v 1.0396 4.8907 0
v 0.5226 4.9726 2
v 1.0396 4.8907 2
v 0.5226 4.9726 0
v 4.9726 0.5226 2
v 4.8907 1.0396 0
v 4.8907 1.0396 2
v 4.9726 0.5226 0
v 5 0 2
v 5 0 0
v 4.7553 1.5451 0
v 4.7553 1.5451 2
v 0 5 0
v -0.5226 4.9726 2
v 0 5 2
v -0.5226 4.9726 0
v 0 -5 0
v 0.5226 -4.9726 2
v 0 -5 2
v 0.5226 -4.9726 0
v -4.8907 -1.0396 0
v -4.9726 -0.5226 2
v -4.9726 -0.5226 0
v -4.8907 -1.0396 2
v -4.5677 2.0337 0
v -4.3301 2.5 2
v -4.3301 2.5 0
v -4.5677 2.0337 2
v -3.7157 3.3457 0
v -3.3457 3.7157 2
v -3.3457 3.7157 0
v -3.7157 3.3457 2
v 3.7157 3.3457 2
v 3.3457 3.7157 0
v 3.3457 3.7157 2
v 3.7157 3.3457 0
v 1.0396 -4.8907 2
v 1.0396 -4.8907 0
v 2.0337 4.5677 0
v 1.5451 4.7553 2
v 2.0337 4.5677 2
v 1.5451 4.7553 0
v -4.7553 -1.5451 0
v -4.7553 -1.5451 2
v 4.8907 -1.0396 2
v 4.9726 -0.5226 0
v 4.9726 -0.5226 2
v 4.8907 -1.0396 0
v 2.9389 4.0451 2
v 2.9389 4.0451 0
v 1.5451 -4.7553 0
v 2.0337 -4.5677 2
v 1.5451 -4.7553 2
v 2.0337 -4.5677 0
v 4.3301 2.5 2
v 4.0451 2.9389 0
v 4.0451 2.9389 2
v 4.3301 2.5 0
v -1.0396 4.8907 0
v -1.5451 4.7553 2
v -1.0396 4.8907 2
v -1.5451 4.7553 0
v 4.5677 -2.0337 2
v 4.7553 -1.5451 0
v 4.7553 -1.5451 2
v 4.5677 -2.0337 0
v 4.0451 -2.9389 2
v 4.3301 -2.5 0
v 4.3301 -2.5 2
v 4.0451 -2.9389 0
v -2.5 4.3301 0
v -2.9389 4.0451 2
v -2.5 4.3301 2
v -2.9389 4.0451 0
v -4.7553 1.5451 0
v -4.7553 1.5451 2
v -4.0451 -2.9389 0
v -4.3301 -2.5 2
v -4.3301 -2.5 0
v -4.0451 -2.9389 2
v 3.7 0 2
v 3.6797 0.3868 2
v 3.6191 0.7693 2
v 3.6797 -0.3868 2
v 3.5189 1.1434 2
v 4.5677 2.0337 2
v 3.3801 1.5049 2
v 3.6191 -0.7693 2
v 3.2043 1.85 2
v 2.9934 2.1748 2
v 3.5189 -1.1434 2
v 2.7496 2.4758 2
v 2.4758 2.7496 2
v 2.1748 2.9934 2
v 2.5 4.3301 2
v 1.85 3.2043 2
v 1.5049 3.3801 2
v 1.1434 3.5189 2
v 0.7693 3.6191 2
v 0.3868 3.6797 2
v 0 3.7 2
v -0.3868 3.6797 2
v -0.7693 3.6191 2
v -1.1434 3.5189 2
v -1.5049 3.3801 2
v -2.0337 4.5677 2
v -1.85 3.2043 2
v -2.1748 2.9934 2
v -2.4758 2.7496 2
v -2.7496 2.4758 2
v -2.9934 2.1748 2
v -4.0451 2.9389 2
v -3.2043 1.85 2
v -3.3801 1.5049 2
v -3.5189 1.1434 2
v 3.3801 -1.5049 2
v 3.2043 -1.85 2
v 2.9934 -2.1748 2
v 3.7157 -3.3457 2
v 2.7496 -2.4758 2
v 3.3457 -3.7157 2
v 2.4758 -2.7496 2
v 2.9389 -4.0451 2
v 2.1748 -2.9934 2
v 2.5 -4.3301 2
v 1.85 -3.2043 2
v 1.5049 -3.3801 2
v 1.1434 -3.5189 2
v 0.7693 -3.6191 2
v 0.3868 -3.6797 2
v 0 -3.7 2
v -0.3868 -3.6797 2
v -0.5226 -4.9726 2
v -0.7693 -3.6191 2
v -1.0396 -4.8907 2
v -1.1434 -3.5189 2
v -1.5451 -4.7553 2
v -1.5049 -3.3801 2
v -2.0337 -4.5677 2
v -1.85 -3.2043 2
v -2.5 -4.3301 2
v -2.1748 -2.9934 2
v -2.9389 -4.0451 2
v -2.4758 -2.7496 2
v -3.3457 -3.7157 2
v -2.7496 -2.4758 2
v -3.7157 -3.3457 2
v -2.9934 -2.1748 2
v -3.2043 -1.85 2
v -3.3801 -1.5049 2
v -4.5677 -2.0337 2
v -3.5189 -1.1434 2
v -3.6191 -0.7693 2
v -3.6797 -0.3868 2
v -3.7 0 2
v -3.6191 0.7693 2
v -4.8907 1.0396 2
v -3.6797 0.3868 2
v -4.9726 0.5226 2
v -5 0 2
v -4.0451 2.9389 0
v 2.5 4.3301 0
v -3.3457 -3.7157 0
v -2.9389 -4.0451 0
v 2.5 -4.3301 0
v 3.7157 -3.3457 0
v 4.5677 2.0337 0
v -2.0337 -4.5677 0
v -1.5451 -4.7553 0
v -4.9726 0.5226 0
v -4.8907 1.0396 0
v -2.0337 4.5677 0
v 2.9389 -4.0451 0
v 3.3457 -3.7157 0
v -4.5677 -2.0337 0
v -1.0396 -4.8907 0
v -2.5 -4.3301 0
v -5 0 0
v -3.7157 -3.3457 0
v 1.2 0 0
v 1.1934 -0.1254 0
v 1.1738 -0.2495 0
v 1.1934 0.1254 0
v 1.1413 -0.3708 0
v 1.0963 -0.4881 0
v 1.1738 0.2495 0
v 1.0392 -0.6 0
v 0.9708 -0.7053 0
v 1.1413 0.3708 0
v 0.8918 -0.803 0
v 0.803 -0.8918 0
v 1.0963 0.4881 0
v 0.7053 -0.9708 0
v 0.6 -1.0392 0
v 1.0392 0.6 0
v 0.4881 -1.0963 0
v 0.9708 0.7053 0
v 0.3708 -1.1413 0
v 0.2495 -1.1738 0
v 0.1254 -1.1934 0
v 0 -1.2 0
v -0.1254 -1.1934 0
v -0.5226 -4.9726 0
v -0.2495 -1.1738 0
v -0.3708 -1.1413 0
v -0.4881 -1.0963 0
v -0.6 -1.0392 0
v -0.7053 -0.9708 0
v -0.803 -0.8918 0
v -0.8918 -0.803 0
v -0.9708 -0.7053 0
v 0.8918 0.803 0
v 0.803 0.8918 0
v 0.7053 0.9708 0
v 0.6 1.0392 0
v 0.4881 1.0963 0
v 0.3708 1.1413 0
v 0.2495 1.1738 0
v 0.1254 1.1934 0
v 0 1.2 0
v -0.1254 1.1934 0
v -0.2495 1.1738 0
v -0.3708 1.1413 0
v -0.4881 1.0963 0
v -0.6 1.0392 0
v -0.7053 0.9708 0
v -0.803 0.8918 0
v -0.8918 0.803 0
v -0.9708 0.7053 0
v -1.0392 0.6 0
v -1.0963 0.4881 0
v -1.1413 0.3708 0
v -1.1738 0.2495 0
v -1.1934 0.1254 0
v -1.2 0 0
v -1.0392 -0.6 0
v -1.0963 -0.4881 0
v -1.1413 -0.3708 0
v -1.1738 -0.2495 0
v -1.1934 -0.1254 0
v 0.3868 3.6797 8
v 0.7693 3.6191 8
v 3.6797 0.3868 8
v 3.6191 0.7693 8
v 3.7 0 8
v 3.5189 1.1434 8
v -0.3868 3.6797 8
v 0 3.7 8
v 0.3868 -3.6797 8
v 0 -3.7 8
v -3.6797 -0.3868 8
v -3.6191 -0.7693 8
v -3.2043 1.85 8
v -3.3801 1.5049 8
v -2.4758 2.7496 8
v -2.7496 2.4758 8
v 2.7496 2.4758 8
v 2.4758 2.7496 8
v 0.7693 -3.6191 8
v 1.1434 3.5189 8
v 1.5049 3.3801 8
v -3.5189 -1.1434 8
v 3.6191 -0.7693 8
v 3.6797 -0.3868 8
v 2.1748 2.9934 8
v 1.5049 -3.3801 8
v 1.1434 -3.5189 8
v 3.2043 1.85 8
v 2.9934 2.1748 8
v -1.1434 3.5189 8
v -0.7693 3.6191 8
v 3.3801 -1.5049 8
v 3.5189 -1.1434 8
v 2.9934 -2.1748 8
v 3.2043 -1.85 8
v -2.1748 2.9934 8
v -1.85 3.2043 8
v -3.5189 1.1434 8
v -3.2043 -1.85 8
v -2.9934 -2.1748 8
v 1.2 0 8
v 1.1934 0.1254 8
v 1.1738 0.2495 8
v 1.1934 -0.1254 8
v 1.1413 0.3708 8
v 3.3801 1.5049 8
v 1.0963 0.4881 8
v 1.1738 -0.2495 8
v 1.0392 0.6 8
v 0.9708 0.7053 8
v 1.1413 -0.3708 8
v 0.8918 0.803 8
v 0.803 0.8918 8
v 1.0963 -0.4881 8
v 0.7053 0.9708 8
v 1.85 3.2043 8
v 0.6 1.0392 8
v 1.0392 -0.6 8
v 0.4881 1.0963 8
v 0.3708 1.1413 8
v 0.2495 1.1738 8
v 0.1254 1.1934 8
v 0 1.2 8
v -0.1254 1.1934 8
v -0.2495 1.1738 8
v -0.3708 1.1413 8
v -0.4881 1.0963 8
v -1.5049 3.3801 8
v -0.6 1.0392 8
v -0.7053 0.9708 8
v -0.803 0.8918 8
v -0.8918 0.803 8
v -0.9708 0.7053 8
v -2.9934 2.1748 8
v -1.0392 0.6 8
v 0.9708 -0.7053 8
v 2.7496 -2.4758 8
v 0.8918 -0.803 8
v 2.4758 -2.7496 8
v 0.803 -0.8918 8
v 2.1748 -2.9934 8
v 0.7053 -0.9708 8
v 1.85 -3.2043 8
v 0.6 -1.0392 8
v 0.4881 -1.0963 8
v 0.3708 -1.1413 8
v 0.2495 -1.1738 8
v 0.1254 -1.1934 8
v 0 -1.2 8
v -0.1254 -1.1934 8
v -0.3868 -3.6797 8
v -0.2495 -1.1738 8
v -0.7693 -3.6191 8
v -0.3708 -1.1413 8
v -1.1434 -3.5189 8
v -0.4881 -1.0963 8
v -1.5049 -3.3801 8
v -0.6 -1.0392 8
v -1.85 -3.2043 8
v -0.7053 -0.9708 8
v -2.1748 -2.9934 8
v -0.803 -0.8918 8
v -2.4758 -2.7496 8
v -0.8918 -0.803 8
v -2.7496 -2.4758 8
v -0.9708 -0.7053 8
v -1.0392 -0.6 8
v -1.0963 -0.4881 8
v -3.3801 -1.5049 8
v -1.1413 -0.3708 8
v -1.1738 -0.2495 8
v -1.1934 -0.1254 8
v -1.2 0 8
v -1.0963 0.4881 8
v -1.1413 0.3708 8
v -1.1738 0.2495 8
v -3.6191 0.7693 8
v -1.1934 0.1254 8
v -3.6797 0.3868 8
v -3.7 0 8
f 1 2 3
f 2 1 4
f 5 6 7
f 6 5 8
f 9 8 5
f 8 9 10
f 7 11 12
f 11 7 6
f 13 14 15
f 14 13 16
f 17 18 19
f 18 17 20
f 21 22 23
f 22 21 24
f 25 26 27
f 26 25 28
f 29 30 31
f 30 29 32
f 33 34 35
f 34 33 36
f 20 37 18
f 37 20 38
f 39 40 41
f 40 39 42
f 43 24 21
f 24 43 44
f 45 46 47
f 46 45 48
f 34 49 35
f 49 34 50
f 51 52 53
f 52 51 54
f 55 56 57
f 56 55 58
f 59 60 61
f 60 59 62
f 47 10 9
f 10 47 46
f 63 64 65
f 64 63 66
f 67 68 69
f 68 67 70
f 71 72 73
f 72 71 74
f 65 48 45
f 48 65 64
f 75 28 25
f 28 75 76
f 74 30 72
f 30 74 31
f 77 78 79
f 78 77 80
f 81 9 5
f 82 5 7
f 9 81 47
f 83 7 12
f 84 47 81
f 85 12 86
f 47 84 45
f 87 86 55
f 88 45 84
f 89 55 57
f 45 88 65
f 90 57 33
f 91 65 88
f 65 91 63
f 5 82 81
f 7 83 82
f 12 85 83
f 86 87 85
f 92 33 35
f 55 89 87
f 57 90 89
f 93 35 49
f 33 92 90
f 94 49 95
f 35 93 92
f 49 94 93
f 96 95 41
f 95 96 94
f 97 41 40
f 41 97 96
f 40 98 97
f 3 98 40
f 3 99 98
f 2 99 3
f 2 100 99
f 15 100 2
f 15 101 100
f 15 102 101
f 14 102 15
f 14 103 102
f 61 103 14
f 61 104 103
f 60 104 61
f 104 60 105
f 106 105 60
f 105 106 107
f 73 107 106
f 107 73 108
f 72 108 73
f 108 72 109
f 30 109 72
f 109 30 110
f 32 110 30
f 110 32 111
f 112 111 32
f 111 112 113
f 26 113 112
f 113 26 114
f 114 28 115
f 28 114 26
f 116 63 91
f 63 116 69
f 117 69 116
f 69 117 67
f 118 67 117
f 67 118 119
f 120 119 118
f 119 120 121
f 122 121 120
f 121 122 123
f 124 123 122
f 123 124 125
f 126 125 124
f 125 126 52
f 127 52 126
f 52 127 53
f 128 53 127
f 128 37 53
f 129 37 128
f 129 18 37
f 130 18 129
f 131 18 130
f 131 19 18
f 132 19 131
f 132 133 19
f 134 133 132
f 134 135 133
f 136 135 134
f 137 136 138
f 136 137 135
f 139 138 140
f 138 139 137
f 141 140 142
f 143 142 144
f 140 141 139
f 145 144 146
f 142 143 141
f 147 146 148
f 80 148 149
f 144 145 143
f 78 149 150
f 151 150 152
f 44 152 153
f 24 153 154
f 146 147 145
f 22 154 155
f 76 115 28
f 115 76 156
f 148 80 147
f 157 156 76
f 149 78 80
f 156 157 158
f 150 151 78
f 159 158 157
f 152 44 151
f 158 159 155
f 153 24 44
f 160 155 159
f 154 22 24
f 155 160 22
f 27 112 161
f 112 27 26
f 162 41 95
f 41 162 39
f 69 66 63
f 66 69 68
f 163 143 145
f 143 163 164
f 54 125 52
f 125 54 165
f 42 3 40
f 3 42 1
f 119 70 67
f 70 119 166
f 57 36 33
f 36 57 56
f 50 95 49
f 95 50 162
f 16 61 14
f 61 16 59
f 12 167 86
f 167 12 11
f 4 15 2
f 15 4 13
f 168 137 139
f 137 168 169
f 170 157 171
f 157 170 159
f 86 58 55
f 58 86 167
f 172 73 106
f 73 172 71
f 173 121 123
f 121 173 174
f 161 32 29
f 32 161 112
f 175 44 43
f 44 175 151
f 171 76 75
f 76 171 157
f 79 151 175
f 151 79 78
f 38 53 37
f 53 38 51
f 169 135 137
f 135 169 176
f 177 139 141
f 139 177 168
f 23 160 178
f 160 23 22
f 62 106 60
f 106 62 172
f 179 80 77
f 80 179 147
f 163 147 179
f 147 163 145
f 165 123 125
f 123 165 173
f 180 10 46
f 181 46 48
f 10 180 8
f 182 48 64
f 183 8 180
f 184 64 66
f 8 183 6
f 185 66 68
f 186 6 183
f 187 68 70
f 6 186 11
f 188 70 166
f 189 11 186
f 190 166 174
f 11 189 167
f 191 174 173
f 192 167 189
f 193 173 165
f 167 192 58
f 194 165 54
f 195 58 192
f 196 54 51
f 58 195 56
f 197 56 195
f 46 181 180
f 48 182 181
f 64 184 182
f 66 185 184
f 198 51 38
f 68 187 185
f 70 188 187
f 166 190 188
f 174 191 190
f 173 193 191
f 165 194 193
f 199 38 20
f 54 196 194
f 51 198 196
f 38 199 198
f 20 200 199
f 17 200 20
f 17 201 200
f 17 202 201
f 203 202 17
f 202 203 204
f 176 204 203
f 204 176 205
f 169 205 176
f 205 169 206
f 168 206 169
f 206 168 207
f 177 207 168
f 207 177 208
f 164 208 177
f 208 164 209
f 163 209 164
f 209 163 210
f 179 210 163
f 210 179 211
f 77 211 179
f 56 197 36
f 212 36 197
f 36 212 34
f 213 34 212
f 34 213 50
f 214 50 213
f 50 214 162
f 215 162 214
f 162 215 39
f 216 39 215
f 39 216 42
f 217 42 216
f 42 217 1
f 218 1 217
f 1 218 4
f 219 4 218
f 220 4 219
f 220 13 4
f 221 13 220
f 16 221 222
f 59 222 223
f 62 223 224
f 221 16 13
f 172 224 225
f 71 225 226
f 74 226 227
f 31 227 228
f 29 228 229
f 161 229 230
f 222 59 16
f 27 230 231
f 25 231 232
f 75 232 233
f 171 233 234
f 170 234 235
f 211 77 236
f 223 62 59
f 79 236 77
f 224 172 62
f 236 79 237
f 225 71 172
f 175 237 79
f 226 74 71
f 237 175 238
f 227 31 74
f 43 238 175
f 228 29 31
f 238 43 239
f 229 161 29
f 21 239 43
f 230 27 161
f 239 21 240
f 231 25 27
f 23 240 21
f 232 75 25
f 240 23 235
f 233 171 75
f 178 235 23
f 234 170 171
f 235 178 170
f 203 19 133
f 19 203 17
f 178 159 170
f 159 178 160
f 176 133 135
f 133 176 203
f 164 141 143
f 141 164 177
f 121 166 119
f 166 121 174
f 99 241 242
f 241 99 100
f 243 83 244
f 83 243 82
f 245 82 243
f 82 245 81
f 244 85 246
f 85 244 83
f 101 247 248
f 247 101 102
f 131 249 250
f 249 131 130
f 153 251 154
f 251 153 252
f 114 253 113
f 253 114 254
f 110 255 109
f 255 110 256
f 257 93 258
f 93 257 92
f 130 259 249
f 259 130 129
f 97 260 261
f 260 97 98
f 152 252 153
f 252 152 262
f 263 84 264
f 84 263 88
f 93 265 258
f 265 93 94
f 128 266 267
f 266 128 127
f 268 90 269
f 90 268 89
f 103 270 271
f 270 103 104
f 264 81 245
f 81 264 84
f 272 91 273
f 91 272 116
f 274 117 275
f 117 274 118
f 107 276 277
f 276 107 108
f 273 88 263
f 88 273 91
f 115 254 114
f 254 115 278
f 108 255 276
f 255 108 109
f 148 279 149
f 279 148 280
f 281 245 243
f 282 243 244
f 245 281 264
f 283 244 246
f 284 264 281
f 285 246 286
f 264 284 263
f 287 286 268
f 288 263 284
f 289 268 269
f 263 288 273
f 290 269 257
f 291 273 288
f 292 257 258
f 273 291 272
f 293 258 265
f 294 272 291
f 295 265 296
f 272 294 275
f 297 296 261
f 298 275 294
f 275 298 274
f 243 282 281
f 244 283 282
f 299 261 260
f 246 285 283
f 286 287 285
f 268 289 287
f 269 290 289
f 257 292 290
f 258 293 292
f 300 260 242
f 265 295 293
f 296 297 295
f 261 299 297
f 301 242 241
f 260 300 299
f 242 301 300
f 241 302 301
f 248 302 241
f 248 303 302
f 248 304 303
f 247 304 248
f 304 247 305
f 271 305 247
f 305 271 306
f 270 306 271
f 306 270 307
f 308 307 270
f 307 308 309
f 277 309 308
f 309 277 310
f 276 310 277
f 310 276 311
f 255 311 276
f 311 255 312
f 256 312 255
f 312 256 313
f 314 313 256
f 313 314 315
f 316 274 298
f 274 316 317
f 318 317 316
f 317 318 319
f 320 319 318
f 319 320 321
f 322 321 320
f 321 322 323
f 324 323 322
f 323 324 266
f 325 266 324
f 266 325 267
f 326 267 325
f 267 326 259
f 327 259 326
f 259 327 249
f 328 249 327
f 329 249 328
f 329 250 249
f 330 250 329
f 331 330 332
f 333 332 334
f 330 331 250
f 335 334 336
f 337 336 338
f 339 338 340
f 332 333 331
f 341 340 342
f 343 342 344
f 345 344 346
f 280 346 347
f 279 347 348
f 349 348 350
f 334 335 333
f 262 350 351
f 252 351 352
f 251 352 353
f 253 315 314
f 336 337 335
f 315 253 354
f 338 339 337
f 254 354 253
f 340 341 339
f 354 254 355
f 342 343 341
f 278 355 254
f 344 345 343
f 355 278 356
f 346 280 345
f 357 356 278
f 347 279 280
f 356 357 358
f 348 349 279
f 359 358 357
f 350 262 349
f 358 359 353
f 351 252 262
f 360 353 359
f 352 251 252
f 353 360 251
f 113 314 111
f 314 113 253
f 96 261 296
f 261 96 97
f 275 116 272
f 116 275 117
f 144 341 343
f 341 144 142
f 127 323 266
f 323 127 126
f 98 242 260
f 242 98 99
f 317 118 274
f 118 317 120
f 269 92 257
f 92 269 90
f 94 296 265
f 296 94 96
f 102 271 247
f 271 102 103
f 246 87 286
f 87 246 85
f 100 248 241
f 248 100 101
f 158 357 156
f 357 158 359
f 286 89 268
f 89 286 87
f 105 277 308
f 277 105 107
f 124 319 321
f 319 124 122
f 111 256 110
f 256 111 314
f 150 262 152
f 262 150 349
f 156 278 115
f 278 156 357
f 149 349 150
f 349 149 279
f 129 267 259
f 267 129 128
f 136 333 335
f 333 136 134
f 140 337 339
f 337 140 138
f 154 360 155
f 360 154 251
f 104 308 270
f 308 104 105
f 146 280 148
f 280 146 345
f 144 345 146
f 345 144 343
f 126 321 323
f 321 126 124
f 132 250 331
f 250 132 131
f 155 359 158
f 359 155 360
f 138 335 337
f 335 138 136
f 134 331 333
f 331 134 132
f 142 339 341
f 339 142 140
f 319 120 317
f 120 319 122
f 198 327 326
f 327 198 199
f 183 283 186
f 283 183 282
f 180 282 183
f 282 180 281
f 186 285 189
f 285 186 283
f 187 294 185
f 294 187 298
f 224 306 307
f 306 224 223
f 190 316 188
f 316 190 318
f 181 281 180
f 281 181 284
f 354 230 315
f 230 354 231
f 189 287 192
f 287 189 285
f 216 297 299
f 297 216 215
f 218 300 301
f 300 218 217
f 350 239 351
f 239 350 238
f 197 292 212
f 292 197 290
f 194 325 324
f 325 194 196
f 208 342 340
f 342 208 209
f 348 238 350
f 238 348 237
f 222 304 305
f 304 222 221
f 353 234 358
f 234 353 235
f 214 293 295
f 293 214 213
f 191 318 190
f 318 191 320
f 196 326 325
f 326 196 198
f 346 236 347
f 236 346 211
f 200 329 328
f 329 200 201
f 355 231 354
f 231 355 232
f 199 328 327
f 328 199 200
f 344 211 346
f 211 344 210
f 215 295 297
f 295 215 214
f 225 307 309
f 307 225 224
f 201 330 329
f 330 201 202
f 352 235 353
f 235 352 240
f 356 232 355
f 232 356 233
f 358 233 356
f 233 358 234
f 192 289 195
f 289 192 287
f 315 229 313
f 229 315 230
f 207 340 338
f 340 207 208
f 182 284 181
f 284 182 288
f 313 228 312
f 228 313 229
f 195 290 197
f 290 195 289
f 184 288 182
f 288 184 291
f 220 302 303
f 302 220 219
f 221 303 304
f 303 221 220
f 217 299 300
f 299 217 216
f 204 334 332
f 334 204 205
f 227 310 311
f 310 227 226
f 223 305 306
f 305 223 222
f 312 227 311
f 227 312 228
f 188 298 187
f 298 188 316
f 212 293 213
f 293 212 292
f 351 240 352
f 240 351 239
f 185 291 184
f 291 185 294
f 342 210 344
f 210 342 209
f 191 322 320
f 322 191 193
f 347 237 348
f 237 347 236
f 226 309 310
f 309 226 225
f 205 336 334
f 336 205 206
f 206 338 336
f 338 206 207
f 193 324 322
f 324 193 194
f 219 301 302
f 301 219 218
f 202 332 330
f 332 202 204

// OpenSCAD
// Wall-mount standoff with screw flange.
$fn = 60;
eps = 0.02;
thread_d = 2.4;
base_d = 10;
length = 8;
difference() { union() { cylinder(d=base_d,h=2); cylinder(d=thread_d+5,h=length); } translate([0,0,-eps]) cylinder(d=thread_d,h=length+2*eps); }
